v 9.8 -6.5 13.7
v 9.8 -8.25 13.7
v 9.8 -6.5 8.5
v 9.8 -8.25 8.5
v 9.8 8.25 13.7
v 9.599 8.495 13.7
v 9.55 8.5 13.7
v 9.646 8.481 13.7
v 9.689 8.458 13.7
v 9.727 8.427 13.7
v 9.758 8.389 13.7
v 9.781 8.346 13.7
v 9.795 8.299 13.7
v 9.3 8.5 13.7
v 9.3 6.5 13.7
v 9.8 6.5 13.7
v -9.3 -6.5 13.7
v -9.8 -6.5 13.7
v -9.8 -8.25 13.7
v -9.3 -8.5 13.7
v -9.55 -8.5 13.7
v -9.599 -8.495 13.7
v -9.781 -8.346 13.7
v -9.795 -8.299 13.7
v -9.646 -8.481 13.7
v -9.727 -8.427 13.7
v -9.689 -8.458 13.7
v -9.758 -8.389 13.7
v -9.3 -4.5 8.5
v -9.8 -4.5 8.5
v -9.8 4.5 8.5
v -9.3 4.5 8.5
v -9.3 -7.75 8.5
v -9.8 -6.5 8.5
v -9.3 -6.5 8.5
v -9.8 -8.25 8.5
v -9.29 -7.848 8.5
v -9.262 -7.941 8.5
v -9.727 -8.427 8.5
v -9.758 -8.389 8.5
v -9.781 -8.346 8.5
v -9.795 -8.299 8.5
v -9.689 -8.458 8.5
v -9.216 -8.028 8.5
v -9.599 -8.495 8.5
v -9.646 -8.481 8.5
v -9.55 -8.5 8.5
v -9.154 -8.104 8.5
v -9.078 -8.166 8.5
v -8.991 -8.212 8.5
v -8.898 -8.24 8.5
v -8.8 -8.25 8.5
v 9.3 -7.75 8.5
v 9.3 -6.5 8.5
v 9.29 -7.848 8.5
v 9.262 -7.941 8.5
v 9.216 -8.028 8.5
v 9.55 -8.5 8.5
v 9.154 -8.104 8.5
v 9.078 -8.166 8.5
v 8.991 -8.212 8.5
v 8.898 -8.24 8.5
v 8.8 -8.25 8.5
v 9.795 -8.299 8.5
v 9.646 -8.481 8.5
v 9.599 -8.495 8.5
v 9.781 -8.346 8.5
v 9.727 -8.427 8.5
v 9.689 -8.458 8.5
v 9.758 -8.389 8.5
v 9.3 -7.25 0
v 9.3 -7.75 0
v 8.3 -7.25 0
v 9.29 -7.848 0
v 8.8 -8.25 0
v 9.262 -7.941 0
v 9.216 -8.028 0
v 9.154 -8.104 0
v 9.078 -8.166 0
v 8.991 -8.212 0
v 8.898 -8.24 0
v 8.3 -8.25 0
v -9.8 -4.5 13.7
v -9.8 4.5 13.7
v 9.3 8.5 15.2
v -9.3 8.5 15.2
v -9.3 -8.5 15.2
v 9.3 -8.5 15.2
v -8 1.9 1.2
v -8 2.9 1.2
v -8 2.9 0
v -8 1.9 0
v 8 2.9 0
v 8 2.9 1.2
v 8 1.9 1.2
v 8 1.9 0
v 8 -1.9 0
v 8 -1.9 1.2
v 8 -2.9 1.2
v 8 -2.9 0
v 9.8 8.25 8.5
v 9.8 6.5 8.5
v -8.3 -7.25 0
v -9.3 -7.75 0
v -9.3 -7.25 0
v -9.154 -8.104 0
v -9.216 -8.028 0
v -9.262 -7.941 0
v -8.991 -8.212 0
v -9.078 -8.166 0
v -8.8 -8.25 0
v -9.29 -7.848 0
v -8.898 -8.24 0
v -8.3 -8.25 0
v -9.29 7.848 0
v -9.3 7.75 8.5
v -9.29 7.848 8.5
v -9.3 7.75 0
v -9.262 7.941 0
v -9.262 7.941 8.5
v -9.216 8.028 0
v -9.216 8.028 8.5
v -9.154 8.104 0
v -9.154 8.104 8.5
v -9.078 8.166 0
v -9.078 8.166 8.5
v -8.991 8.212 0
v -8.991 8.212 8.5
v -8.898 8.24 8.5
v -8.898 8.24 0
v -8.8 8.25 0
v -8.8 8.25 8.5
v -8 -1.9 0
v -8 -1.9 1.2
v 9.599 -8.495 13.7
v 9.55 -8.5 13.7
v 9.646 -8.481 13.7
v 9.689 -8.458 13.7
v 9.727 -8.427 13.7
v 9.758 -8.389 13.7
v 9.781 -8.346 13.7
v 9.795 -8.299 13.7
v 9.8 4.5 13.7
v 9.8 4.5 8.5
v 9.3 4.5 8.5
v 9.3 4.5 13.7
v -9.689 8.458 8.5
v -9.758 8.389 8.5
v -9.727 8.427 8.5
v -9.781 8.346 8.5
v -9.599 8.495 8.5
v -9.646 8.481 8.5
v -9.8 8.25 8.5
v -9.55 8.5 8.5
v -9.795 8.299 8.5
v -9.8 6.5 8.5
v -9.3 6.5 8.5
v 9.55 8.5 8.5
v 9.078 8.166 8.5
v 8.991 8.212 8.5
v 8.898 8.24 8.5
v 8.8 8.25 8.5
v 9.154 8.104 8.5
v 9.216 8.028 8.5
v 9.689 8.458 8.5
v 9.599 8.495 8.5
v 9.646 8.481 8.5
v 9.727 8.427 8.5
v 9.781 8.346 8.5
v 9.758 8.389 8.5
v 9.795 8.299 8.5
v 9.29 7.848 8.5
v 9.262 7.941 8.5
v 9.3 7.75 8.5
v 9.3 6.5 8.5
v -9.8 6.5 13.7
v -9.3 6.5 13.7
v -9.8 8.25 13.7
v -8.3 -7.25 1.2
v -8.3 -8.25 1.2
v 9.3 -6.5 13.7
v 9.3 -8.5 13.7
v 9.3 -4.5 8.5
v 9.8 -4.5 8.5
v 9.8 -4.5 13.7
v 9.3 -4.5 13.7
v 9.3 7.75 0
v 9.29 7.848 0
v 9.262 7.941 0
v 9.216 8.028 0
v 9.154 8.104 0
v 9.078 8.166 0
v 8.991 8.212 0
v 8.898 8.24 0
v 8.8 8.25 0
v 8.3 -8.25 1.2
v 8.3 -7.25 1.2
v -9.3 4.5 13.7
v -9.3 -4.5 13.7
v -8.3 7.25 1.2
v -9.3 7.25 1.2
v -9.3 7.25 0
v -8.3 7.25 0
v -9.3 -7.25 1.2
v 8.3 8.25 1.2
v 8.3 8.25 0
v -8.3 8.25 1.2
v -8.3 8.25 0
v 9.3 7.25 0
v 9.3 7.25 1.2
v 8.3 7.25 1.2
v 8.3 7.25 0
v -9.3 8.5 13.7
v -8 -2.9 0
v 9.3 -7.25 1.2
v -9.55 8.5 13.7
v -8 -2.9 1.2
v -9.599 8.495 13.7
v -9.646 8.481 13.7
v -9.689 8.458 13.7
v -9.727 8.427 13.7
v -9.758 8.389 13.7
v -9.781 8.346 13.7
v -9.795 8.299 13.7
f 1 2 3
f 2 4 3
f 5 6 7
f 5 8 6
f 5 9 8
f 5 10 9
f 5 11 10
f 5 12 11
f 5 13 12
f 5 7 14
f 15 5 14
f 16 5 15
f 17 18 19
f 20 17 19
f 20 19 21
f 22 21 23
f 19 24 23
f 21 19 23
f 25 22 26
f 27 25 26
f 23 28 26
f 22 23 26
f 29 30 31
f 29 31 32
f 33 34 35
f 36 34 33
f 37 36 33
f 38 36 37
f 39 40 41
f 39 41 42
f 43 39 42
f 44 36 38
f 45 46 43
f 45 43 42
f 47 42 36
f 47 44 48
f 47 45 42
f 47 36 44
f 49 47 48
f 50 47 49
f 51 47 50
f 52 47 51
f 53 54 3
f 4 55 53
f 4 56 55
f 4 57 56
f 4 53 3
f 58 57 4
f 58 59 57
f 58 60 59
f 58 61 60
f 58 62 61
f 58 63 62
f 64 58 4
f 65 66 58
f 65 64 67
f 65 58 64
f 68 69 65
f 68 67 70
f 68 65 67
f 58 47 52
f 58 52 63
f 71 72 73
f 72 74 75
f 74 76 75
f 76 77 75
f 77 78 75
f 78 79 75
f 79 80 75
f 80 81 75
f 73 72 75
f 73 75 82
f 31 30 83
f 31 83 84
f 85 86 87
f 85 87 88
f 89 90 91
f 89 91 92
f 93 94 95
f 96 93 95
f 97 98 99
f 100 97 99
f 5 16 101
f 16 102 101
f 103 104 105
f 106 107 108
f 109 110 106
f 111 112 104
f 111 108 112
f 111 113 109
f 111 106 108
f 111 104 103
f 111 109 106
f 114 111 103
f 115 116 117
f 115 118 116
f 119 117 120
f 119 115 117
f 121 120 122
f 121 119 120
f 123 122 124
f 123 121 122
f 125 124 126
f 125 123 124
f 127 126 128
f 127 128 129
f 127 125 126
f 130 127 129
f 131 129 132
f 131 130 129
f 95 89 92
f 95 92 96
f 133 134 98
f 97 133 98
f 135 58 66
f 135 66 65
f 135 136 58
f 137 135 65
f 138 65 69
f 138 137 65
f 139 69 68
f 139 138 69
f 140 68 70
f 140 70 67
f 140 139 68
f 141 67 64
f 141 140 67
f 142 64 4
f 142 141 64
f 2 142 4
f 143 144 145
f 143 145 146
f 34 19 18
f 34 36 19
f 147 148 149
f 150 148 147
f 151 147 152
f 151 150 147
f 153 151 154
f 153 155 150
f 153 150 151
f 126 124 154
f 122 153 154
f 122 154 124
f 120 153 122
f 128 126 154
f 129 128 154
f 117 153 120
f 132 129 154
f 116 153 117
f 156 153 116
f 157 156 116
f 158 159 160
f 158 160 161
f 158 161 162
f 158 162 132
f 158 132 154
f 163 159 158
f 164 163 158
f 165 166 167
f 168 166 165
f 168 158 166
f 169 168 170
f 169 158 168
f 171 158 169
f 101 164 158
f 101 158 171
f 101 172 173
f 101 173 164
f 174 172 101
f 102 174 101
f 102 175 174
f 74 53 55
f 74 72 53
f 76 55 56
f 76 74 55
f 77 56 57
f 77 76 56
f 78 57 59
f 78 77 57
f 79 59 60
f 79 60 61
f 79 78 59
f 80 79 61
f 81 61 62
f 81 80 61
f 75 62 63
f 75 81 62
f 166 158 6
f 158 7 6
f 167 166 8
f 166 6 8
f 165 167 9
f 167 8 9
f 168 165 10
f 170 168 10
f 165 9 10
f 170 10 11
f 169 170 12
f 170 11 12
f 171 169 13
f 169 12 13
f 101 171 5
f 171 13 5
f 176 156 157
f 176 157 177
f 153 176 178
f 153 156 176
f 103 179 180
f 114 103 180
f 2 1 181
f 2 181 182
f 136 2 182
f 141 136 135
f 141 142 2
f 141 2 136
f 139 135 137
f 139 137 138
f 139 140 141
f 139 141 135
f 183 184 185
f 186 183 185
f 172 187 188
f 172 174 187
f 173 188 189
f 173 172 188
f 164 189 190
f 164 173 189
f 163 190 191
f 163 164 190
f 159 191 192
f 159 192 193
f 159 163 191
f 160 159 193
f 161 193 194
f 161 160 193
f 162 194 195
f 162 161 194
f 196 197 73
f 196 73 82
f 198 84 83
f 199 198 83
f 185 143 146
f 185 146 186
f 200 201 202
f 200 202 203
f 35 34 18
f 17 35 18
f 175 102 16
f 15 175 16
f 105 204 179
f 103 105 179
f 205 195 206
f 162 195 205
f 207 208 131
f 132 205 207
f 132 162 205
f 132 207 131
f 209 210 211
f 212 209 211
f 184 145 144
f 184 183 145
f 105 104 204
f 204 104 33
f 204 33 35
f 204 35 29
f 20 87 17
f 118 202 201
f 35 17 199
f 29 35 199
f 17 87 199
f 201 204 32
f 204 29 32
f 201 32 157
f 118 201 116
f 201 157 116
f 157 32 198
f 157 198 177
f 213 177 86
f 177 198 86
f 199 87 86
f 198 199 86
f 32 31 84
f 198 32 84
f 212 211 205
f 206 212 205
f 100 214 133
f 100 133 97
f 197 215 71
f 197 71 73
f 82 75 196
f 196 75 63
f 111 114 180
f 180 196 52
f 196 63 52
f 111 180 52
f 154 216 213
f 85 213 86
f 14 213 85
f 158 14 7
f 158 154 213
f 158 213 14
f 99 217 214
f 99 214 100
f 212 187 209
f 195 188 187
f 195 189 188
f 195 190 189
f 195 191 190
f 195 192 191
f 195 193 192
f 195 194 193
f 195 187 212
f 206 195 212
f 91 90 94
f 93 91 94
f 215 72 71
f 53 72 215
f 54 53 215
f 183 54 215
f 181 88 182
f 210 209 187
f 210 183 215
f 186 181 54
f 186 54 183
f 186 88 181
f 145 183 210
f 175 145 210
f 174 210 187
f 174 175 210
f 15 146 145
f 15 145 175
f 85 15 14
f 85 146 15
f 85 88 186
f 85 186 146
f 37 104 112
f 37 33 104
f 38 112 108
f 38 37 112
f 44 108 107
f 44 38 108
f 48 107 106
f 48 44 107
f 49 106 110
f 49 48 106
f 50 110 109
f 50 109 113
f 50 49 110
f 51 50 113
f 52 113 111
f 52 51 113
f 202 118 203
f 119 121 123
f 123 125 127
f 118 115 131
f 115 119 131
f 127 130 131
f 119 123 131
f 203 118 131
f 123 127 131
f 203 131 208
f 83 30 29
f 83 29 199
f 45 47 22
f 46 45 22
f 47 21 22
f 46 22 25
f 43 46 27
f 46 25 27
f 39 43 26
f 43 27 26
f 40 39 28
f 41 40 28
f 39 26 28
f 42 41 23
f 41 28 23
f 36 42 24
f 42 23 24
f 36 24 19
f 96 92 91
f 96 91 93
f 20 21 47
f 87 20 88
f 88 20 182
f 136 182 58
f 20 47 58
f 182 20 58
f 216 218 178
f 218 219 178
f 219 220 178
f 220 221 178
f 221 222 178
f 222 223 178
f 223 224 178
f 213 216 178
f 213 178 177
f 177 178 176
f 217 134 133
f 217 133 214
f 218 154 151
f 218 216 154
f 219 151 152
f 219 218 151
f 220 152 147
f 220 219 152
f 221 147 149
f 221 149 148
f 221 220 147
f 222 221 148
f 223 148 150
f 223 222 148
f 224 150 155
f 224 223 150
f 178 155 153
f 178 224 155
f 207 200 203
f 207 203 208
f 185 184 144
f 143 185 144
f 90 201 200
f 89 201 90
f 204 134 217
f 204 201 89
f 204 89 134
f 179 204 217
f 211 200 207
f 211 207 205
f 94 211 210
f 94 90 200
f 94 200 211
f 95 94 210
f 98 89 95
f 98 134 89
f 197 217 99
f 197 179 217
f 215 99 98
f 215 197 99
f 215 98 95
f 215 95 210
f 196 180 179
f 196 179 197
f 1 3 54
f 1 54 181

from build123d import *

# Parameters (mm, degrees)
SKETCH_W                      = 19.6
SKETCH_H                      = 17
PAD_DEPTH                     = 15.7
SKETCH001_W                   = 19.6
SKETCH001_H                   = 8.5
POCKET_DEPTH                  = 0.25
SKETCH002_W                   = 16.5
SKETCH002_H                   = 8.5
POCKET001_DEPTH               = 0.5
SKETCH008_W                   = 19.6
SKETCH008_H                   = 17
POCKET002_DEPTH               = 0.5
SKETCH009_W                   = 17
SKETCH009_H                   = 1.5
POCKET003_DEPTH               = 0.5
SKETCH010_W                   = 2
SKETCH010_H                   = 5.2
POCKET004_DEPTH               = 0.5
SKETCH010_MIRRORED005_2_W     = 2
SKETCH010_MIRRORED005_2_H     = 5.2
POCKET004_MIRRORED005_2_DEPTH = 0.5
SKETCH024_W                   = 19.6
SKETCH024_H                   = 17
POCKET006_DEPTH               = 1.2
SKETCH025_W                   = 16
SKETCH025_H                   = 1
PAD011_DEPTH                  = 1.2
SKETCH038_W                   = 1
SKETCH038_H                   = 1
PAD014_DEPTH                  = 1.2
SKETCH038_MIRRORED012_2_W     = 1
SKETCH038_MIRRORED012_2_H     = 1
PAD014_MIRRORED012_2_DEPTH    = 1.2
FILLET003_R                   = 0.5
FILLET004_R                   = 0.25


with BuildPart() as part:
    # Sketch → Pad (new body)
    with BuildSketch(Plane.XY):
        Rectangle(SKETCH_W, SKETCH_H)
    extrude(amount=PAD_DEPTH)

    # Sketch001 (on Face3 of Pad) → Pocket (cut)
    with BuildSketch(Plane.XZ.offset(8.5)):
        with Locations((0, 4.25)):
            Rectangle(SKETCH001_W, SKETCH001_H)
    pocket = extrude(amount=-POCKET_DEPTH, mode=Mode.SUBTRACT)

    # Mirrored: Pocket across XZ
    add(pocket.mirror(Plane.XZ), mode=Mode.SUBTRACT)

    # Sketch002 (on Face5 of Mirrored) → Pocket001 (cut)
    with BuildSketch(Plane(origin=(-9.8, 0, 0), x_dir=(0, -1, 0), z_dir=(-1, 0, 0))):
        with Locations((0, 4.25)):
            Rectangle(SKETCH002_W, SKETCH002_H)
    pocket001 = extrude(amount=-POCKET001_DEPTH, mode=Mode.SUBTRACT)

    # Mirrored001: Pocket001 across YZ
    add(pocket001.mirror(Plane.YZ), mode=Mode.SUBTRACT)

    # Sketch008 (on Face4 of Mirrored001) → Pocket002 (cut)
    with BuildSketch(Plane.XY.offset(15.7)):
        Rectangle(SKETCH008_W, SKETCH008_H)
    extrude(amount=-POCKET002_DEPTH, mode=Mode.SUBTRACT)

    # Sketch009 (on Face4 of Pocket002) → Pocket003 (cut)
    with BuildSketch(Plane(origin=(-9.8, 0, 0), x_dir=(0, -1, 0), z_dir=(-1, 0, 0))):
        with Locations((0, 14.45)):
            Rectangle(SKETCH009_W, SKETCH009_H)
    pocket003 = extrude(amount=-POCKET003_DEPTH, mode=Mode.SUBTRACT)

    # Mirrored004: Pocket003 across YZ
    add(pocket003.mirror(Plane.YZ), mode=Mode.SUBTRACT)

    # Sketch010 (on Face8 of Mirrored004) → Pocket004 (cut)
    with BuildSketch(Plane(origin=(-9.8, 0, 0), x_dir=(0, -1, 0), z_dir=(-1, 0, 0))):
        with Locations((-5.5, 11.1)):
            Rectangle(SKETCH010_W, SKETCH010_H)
    pocket004 = extrude(amount=-POCKET004_DEPTH, mode=Mode.SUBTRACT)

    # Sketch010 Mirrored005 2 → Pocket004 Mirrored005 2 (cut)
    with BuildSketch(Plane.YZ.offset(-9.8)):
        with Locations((-5.5, 11.1)):
            Rectangle(SKETCH010_MIRRORED005_2_W, SKETCH010_MIRRORED005_2_H)
    pocket004_mirrored005_2 = extrude(amount=POCKET004_MIRRORED005_2_DEPTH, mode=Mode.SUBTRACT)

    # Mirrored006: Pocket004, Pocket004 Mirrored005 2 across YZ
    add(pocket004.mirror(Plane.YZ), mode=Mode.SUBTRACT)
    add(pocket004_mirrored005_2.mirror(Plane.YZ), mode=Mode.SUBTRACT)

    # Sketch024 (on Face13 of MultiTransform) → Pocket006 (cut)
    with BuildSketch(Plane(origin=(0, 0, 0), x_dir=(1, 0, 0), z_dir=(0, 0, -1))):
        Rectangle(SKETCH024_W, SKETCH024_H)
    extrude(amount=-POCKET006_DEPTH, mode=Mode.SUBTRACT)

    # Sketch025 (on Face12 of Pocket006) → Pad011 (join)
    with BuildSketch(Plane(origin=(0, 0, 1.2), x_dir=(1, 0, 0), z_dir=(0, 0, -1))):
        with Locations((0, 2.4)):
            Rectangle(SKETCH025_W, SKETCH025_H)
        with Locations((0, -2.4)):
            Rectangle(SKETCH025_W, SKETCH025_H)
    extrude(amount=PAD011_DEPTH)

    # Sketch038 (on Face12 of Pad011) → Pad014 (join)
    with BuildSketch(Plane(origin=(0, 0, 1.2), x_dir=(1, 0, 0), z_dir=(0, 0, -1))):
        with Locations((-8.8, 7.75)):
            Rectangle(SKETCH038_W, SKETCH038_H)
    pad014 = extrude(amount=PAD014_DEPTH)

    # Sketch038 Mirrored012 2 → Pad014 Mirrored012 2 (add)
    with BuildSketch(Plane.XY.offset(1.2)):
        with Locations((-8.8, 7.75)):
            Rectangle(SKETCH038_MIRRORED012_2_W, SKETCH038_MIRRORED012_2_H)
    pad014_mirrored012_2 = extrude(amount=-PAD014_MIRRORED012_2_DEPTH)

    # Mirrored013: Pad014, Pad014 Mirrored012 2 across YZ
    add(pad014.mirror(Plane.YZ))
    add(pad014_mirrored012_2.mirror(Plane.YZ))

    # Fillet003
    fillet003_edges = [part.edges().sort_by_distance(p)[0] for p in [
        (9.3, -8.25, 4.25),
        (-9.3, -8.25, 4.25),
        (9.3, 8.25, 4.25),
        (-9.3, 8.25, 4.25),
    ]]
    fillet(fillet003_edges, radius=FILLET003_R)

    # Fillet004
    fillet004_edges = [part.edges().sort_by_distance(p)[0] for p in [
        (-9.8, 8.5, 11.1),
        (-9.8, -8.5, 11.1),
        (9.8, 8.5, 11.1),
        (9.8, -8.5, 11.1),
    ]]
    fillet(fillet004_edges, radius=FILLET004_R)


solid = part.part
